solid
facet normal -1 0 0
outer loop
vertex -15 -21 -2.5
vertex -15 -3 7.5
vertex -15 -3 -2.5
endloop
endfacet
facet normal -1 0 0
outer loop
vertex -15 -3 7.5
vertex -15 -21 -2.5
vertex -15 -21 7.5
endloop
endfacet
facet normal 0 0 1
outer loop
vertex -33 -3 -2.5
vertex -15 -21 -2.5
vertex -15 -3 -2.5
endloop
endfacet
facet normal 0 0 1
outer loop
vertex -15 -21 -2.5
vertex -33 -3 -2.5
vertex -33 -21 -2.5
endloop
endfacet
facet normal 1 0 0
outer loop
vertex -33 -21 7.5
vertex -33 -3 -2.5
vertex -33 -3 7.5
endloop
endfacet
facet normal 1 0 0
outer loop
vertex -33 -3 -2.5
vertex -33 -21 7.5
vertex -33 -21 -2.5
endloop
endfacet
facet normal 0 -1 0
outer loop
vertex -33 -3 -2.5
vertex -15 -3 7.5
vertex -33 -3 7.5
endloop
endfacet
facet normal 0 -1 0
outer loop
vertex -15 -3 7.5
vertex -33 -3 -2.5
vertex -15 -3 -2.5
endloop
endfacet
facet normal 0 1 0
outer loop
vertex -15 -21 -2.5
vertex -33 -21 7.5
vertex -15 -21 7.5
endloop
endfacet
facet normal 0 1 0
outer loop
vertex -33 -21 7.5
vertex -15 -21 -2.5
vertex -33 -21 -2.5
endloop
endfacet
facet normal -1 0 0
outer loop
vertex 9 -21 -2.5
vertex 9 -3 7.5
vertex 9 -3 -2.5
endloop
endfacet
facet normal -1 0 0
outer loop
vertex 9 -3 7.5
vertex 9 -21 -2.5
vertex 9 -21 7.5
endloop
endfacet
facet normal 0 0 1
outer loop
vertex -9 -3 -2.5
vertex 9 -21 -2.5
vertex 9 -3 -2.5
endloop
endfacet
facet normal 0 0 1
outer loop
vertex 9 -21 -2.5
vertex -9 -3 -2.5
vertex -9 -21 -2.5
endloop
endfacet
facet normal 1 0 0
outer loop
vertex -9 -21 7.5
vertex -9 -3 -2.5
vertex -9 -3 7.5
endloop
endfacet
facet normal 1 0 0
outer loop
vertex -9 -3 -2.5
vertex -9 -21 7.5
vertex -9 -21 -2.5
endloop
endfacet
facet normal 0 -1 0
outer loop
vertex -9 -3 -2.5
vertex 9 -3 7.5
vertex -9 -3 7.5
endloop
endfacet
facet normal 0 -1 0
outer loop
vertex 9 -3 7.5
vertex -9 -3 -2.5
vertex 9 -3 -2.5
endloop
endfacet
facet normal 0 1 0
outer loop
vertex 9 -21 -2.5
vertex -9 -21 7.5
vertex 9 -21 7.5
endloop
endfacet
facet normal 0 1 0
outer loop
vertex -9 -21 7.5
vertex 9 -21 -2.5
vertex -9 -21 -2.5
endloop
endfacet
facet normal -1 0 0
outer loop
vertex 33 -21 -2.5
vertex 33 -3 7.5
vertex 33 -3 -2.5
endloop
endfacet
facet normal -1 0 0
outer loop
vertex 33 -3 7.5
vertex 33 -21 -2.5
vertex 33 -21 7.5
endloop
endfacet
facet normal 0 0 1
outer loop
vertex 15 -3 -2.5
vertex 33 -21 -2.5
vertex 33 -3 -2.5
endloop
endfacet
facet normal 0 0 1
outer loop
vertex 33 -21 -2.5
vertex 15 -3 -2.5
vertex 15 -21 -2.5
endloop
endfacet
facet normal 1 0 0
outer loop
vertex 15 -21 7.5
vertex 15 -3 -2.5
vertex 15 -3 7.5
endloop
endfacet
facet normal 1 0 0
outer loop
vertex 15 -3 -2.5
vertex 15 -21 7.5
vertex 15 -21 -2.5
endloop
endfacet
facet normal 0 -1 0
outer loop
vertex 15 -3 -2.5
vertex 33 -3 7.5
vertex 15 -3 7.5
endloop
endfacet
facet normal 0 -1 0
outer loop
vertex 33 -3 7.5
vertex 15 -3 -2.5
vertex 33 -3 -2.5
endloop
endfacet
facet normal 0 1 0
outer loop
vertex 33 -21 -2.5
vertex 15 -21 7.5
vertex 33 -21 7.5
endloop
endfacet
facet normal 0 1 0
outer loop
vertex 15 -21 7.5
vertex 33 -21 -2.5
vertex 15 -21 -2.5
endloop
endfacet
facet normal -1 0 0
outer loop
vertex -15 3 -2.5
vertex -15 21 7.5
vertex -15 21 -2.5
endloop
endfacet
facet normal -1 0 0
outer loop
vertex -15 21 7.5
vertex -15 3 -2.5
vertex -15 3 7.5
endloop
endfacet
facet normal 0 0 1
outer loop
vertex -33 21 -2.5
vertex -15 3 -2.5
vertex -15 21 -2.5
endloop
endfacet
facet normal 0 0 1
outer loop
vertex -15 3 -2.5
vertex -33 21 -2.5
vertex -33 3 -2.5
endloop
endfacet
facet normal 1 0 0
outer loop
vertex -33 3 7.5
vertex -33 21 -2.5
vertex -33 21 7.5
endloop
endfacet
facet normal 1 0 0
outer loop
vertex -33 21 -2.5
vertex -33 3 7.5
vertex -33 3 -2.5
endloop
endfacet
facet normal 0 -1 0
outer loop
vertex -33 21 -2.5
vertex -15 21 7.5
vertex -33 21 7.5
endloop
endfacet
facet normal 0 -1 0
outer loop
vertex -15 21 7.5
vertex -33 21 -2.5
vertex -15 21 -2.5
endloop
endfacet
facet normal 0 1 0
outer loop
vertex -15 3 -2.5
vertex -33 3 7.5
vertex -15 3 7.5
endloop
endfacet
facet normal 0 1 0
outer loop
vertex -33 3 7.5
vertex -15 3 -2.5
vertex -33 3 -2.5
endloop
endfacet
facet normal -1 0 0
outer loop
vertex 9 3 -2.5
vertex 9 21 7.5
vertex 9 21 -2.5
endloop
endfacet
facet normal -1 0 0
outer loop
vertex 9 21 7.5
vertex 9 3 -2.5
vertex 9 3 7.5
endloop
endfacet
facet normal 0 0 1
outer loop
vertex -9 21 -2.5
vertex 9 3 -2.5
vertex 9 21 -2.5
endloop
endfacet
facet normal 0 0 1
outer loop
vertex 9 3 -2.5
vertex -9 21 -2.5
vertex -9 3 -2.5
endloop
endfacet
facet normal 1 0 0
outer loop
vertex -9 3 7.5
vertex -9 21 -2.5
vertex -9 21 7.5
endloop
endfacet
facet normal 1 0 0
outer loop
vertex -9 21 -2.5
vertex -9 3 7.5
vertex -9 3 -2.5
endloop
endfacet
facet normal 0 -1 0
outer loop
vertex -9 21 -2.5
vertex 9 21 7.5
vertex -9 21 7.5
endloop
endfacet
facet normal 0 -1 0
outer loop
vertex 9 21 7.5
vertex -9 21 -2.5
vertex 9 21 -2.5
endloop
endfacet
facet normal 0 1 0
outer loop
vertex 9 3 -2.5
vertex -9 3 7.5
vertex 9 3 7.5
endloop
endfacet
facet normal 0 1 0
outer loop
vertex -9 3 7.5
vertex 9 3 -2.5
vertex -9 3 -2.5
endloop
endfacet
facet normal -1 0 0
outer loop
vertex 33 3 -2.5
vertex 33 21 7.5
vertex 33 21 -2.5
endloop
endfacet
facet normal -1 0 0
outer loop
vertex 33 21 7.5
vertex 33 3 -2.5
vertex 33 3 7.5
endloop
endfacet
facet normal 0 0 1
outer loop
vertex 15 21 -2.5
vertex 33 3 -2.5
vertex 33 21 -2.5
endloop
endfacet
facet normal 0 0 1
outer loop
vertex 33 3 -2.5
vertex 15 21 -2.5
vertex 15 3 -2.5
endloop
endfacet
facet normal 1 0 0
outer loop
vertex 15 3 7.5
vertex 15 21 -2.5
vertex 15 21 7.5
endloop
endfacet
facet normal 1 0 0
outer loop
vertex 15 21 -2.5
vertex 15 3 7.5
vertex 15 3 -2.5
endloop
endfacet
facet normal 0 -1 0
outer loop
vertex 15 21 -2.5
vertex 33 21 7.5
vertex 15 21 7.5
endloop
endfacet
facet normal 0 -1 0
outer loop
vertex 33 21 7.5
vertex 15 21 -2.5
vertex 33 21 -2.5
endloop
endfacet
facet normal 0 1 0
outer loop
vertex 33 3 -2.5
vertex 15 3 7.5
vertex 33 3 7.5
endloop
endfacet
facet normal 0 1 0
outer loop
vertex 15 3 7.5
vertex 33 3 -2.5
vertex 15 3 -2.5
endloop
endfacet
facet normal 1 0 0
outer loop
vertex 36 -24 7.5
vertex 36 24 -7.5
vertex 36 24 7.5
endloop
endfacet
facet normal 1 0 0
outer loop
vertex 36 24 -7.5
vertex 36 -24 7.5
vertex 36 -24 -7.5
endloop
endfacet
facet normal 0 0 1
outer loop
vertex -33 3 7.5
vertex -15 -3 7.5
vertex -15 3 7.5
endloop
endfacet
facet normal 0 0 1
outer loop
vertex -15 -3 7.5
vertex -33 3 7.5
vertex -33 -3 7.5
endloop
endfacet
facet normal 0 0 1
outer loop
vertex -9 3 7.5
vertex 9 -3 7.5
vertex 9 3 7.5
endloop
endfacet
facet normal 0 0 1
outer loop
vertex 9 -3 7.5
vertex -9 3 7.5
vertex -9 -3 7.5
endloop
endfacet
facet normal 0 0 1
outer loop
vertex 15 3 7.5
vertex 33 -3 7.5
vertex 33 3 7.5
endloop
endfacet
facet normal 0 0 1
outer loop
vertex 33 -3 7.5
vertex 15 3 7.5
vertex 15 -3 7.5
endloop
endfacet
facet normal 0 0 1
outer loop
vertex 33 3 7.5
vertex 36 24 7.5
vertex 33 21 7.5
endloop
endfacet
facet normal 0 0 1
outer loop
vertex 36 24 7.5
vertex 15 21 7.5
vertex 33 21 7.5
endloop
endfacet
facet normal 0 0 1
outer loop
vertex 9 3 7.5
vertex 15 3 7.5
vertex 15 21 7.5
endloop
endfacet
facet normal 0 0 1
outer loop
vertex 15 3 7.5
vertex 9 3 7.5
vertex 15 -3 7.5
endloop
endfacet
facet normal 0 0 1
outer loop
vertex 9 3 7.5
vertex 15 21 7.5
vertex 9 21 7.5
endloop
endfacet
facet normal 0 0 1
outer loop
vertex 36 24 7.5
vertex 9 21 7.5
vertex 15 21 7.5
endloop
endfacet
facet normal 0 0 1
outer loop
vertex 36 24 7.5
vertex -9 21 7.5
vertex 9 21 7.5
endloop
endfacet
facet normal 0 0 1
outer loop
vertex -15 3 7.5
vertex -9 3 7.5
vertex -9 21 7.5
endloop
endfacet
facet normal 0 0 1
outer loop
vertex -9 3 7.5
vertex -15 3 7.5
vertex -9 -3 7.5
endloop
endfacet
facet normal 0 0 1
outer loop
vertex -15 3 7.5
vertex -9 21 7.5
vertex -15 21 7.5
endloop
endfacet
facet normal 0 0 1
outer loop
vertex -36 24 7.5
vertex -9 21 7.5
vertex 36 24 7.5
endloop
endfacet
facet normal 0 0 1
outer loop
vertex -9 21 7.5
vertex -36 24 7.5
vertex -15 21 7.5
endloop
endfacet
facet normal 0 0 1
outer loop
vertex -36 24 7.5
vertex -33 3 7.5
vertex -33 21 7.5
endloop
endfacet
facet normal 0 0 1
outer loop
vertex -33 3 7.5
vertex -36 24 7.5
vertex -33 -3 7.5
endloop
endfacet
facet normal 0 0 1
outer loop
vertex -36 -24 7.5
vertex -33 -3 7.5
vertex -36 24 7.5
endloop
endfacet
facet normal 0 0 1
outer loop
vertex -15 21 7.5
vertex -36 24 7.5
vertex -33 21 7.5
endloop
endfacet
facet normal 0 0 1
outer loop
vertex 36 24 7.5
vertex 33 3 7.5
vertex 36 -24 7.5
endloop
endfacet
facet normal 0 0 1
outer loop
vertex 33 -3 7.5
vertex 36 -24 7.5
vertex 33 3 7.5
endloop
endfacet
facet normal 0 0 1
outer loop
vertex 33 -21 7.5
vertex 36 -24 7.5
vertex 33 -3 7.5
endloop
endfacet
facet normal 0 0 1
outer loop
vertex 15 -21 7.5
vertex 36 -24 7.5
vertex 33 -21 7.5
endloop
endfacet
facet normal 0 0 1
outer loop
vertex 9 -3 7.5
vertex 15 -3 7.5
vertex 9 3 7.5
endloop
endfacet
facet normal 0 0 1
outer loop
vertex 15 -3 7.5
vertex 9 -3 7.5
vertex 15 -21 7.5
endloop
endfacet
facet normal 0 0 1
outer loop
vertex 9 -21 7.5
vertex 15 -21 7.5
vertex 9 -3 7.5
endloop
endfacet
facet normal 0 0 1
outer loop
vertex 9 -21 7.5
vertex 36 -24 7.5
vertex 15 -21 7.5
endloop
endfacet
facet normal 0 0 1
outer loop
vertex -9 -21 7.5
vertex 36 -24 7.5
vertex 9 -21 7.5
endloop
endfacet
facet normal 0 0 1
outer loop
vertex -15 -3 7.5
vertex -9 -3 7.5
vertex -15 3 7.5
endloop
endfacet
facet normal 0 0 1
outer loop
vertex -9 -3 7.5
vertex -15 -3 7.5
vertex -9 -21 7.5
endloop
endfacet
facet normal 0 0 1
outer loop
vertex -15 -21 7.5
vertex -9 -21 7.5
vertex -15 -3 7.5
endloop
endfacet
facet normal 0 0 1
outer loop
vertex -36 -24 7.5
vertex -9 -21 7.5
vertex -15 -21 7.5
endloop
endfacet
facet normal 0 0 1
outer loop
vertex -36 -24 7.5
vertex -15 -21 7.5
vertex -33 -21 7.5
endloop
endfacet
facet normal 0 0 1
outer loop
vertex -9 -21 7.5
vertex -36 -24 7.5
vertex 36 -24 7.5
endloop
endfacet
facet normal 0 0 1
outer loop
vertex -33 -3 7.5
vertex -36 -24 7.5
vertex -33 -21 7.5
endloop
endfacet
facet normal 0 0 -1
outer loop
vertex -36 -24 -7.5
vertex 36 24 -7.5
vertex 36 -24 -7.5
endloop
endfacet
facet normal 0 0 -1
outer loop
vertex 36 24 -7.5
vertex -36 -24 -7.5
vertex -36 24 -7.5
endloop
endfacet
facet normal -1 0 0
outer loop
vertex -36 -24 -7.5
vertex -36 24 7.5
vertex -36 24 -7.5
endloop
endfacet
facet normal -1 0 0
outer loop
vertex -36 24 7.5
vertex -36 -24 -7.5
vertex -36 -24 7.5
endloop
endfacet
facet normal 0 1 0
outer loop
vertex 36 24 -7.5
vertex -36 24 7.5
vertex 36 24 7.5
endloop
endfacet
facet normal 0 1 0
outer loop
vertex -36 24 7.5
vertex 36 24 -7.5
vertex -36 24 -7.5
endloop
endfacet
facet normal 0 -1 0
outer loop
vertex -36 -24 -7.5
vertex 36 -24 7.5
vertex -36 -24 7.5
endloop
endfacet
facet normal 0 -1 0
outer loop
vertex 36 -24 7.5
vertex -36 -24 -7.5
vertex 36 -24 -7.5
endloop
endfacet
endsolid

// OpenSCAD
$fn = 32;

// ----------------------------------------------------------------------
// Pocket plate 72 x 48 x 15
// 2 x 3 pockets 18 mm square, 10 mm deep
// ----------------------------------------------------------------------

// --- parameters (mm) ---
thickness = 15;  // plate thickness
floor_t = 5;     // material left under each pocket
pocket = 18;     // pocket side length
pitch_x = 24;    // pocket pitch along X
pitch_y = 24;    // pocket pitch along Y
cols = 3;        // pockets per row
rows = 2;        // rows of pockets

// --- derived feature positions (mm) ---
depth = thickness - floor_t;        // = 10   pocket depth, down to the floor
span_x = (cols - 1) * pitch_x;      // = 48   distance between outer pockets
span_y = (rows - 1) * pitch_y;      // = 24   distance between outer pocket rows
origin_x = -span_x / 2;             // = -24   X of the first pocket
origin_y = -span_y / 2;             // = -12   Y of the first pocket
plate = [span_x + pocket + 6, span_y + pocket + 6, thickness];  // = [72, 48, 15]   overall size: pockets plus 3 mm of wall on each side
feature_centers = [
  [origin_x + 0 * pitch_x, origin_y + 0 * pitch_y],
  [origin_x + 1 * pitch_x, origin_y + 0 * pitch_y],
  [origin_x + 2 * pitch_x, origin_y + 0 * pitch_y],
  [origin_x + 0 * pitch_x, origin_y + 1 * pitch_y],
  [origin_x + 1 * pitch_x, origin_y + 1 * pitch_y],
  [origin_x + 2 * pitch_x, origin_y + 1 * pitch_y]
];   // pocket centres, used verbatim by the cutter loop

// plate outline, then one pocket per centre in feature_centers
difference() {
  cube(plate, center = true);
  for (centre = feature_centers)
    translate([centre[0] - pocket / 2, centre[1] - pocket / 2, plate[2] / 2 - depth])
      cube([pocket, pocket, depth + 1]);  // centred on the declared pocket centre
}
